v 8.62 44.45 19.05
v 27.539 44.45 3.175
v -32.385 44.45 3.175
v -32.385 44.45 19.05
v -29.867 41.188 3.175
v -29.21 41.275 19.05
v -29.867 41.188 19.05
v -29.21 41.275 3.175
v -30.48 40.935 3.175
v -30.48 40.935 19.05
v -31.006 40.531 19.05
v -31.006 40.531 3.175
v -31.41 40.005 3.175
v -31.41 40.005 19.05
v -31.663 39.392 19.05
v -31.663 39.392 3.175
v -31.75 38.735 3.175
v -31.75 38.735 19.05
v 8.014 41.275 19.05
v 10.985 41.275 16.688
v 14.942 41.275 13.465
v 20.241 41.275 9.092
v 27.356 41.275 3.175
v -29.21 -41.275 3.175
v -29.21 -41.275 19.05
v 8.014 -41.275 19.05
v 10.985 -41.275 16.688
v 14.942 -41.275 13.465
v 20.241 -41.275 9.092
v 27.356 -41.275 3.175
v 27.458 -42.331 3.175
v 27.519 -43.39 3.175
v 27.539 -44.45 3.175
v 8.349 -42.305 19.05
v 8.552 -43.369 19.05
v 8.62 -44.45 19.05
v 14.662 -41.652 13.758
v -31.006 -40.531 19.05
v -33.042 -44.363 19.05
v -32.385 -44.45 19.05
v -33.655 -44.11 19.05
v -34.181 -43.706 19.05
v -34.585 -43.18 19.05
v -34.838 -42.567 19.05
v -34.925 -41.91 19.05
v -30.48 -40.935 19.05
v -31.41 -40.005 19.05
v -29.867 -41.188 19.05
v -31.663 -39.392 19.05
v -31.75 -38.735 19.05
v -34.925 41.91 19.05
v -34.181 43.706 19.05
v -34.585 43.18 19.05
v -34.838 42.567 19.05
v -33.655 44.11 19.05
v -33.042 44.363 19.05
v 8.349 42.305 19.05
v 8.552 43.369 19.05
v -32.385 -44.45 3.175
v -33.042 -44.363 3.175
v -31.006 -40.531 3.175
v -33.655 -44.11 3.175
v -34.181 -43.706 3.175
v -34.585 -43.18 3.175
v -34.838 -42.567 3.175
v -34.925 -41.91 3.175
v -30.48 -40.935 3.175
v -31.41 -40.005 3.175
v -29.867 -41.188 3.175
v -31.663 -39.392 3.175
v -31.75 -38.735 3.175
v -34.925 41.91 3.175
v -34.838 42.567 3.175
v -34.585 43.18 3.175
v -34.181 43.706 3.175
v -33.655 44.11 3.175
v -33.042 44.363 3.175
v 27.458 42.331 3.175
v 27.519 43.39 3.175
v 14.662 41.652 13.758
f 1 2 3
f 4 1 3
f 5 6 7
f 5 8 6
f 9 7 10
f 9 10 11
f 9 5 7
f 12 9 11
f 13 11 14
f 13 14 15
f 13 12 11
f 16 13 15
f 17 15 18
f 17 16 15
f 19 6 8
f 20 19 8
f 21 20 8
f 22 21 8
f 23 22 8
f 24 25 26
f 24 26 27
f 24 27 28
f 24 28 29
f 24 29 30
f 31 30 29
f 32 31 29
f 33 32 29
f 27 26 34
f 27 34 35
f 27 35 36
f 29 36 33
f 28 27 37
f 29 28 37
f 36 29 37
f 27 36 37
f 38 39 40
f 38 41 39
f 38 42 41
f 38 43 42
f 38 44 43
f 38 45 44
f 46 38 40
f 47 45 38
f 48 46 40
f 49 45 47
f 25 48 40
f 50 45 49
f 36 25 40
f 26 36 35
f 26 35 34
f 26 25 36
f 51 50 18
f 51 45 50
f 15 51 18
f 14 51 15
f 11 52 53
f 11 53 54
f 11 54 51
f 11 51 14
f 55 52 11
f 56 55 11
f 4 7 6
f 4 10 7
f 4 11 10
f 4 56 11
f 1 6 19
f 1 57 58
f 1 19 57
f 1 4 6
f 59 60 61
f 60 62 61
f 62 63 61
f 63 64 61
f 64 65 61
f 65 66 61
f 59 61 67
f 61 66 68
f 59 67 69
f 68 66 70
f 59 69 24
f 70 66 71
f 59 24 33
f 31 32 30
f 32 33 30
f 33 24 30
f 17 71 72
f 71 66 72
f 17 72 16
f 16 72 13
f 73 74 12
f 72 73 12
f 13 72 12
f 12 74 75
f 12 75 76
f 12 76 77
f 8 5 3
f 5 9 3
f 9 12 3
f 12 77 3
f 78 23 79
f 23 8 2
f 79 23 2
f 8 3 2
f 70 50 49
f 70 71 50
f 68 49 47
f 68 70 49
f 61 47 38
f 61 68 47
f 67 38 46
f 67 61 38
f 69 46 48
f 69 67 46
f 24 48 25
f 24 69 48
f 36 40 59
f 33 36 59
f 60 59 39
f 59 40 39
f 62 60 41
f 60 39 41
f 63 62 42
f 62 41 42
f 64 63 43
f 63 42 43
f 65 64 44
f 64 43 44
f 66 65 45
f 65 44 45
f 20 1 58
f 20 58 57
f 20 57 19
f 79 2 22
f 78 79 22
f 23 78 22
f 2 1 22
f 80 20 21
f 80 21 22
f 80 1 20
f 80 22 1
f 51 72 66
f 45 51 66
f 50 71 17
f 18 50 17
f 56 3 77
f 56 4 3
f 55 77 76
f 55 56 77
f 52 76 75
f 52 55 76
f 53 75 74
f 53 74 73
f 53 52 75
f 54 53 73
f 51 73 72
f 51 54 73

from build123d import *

# Parameters (mm, degrees)
F1_DEPTH     = 3.175
F2_DEPTH     = 19.05
F3_DEPTH     = 3.175
F4_T4_ANGLE  = 359.64
F4_T11_ANGLE = 359.64
F4_T16_ANGLE = 359.64
F4_T18_ANGLE = 359.64
F5_R         = 2.54
F6_W         = 173.444584012
F6_H         = 315.2023479342
F7_DEPTH     = 3.175


# Not quite as in the source:
# - a fillet or chamfer that OpenCascade refuses, or shapes differently, is made with other operations: its cross-section is extruded or revolved along the edge and cut away or added


with BuildPart() as f1:
    # F0 (on Top) → F1 (new body)
    with BuildSketch(Plane.XY):
        with BuildLine():
            Line((-34.925, 44.45), (-28.575, 44.45))
            ThreePointArc((-28.575, 44.45), (-39.4151280605, 48.9401280605), (-34.925, 38.1))
            Line((-34.925, 38.1), (-34.925, 44.45))
        make_face()
        with BuildLine():
            ThreePointArc((6.35, 44.45), (0, 50.8), (-6.35, 44.45))
            Line((-6.35, 44.45), (6.35, 44.45))
        make_face()
        with BuildLine():
            Line((-34.925, -44.45), (-34.925, -38.1))
            ThreePointArc((-34.925, -38.1), (-39.4151280605, -48.9401280605), (-28.575, -44.45))
            Line((-28.575, -44.45), (-34.925, -44.45))
        make_face()
        with BuildLine():
            Line((6.35, -44.45), (-6.35, -44.45))
            ThreePointArc((-6.35, -44.45), (0, -50.8), (6.35, -44.45))
        make_face()
        with BuildLine():
            ThreePointArc((-28.575, 44.45), (-28.7913710031, 42.8064990636), (-29.425738686, 41.275))
            Line((-29.425738686, 41.275), (-5.499261314, 41.275))
            ThreePointArc((-5.499261314, 41.275), (-6.1336289969, 42.8064990636), (-6.35, 44.45))
            Line((-6.35, 44.45), (-28.575, 44.45))
        make_face()
        with BuildLine():
            Line((-5.499261314, -41.275), (-29.425738686, -41.275))
            ThreePointArc((-29.425738686, -41.275), (-28.7913710031, -42.8064990636), (-28.575, -44.45))
            Line((-28.575, -44.45), (-6.35, -44.45))
            ThreePointArc((-6.35, -44.45), (-6.1336289969, -42.8064990636), (-5.499261314, -41.275))
        make_face()
        with BuildLine():
            Line((-31.75, -38.950738686), (-31.75, 38.950738686))
            ThreePointArc((-31.75, 38.950738686), (-33.2814990636, 38.3163710031), (-34.925, 38.1))
            Line((-34.925, 38.1), (-34.925, -38.1))
            ThreePointArc((-34.925, -38.1), (-33.2814990636, -38.3163710031), (-31.75, -38.950738686))
        make_face()
        with BuildLine():
            Line((-31.75, 38.950738686), (-31.75, 41.275))
            Line((-31.75, 41.275), (-29.425738686, 41.275))
            ThreePointArc((-29.425738686, 41.275), (-28.7913710031, 42.8064990636), (-28.575, 44.45))
            Line((-28.575, 44.45), (-34.925, 44.45))
            Line((-34.925, 44.45), (-34.925, 38.1))
            ThreePointArc((-34.925, 38.1), (-33.2814990636, 38.3163710031), (-31.75, 38.950738686))
        make_face()
        with BuildLine():
            ThreePointArc((-6.35, 44.45), (-6.1336289969, 42.8064990636), (-5.499261314, 41.275))
            Line((-5.499261314, 41.275), (5.499261314, 41.275))
            ThreePointArc((5.499261314, 41.275), (6.1336289969, 42.8064990636), (6.35, 44.45))
            Line((6.35, 44.45), (-6.35, 44.45))
        make_face()
        with BuildLine():
            Line((-31.75, -41.275), (-31.75, -38.950738686))
            ThreePointArc((-31.75, -38.950738686), (-33.2814990636, -38.3163710031), (-34.925, -38.1))
            Line((-34.925, -38.1), (-34.925, -44.45))
            Line((-34.925, -44.45), (-28.575, -44.45))
            ThreePointArc((-28.575, -44.45), (-28.7913710031, -42.8064990636), (-29.425738686, -41.275))
            Line((-29.425738686, -41.275), (-31.75, -41.275))
        make_face()
        with BuildLine():
            Line((5.499261314, -41.275), (-5.499261314, -41.275))
            ThreePointArc((-5.499261314, -41.275), (-6.1336289969, -42.8064990636), (-6.35, -44.45))
            Line((-6.35, -44.45), (6.35, -44.45))
            ThreePointArc((6.35, -44.45), (6.1336289969, -42.8064990636), (5.499261314, -41.275))
        make_face()
    extrude(amount=F1_DEPTH)

    # F0 (on Top) → F2 (join)
    with BuildSketch(Plane.XY):
        with BuildLine():
            ThreePointArc((-28.575, 44.45), (-28.7913710031, 42.8064990636), (-29.425738686, 41.275))
            Line((-29.425738686, 41.275), (-5.499261314, 41.275))
            ThreePointArc((-5.499261314, 41.275), (-6.1336289969, 42.8064990636), (-6.35, 44.45))
            Line((-6.35, 44.45), (-28.575, 44.45))
        make_face()
        with BuildLine():
            ThreePointArc((-6.35, 44.45), (-6.1336289969, 42.8064990636), (-5.499261314, 41.275))
            Line((-5.499261314, 41.275), (5.499261314, 41.275))
            ThreePointArc((5.499261314, 41.275), (6.1336289969, 42.8064990636), (6.35, 44.45))
            Line((6.35, 44.45), (-6.35, 44.45))
        make_face()
        with BuildLine():
            Line((-31.75, 38.950738686), (-31.75, 41.275))
            Line((-31.75, 41.275), (-29.425738686, 41.275))
            ThreePointArc((-29.425738686, 41.275), (-28.7913710031, 42.8064990636), (-28.575, 44.45))
            Line((-28.575, 44.45), (-34.925, 44.45))
            Line((-34.925, 44.45), (-34.925, 38.1))
            ThreePointArc((-34.925, 38.1), (-33.2814990636, 38.3163710031), (-31.75, 38.950738686))
        make_face()
        with BuildLine():
            Line((-31.75, -38.950738686), (-31.75, 38.950738686))
            ThreePointArc((-31.75, 38.950738686), (-33.2814990636, 38.3163710031), (-34.925, 38.1))
            Line((-34.925, 38.1), (-34.925, -38.1))
            ThreePointArc((-34.925, -38.1), (-33.2814990636, -38.3163710031), (-31.75, -38.950738686))
        make_face()
        with BuildLine():
            Line((-31.75, -41.275), (-31.75, -38.950738686))
            ThreePointArc((-31.75, -38.950738686), (-33.2814990636, -38.3163710031), (-34.925, -38.1))
            Line((-34.925, -38.1), (-34.925, -44.45))
            Line((-34.925, -44.45), (-28.575, -44.45))
            ThreePointArc((-28.575, -44.45), (-28.7913710031, -42.8064990636), (-29.425738686, -41.275))
            Line((-29.425738686, -41.275), (-31.75, -41.275))
        make_face()
        with BuildLine():
            Line((-5.499261314, -41.275), (-29.425738686, -41.275))
            ThreePointArc((-29.425738686, -41.275), (-28.7913710031, -42.8064990636), (-28.575, -44.45))
            Line((-28.575, -44.45), (-6.35, -44.45))
            ThreePointArc((-6.35, -44.45), (-6.1336289969, -42.8064990636), (-5.499261314, -41.275))
        make_face()
        with BuildLine():
            Line((5.499261314, -41.275), (-5.499261314, -41.275))
            ThreePointArc((-5.499261314, -41.275), (-6.1336289969, -42.8064990636), (-6.35, -44.45))
            Line((-6.35, -44.45), (6.35, -44.45))
            ThreePointArc((6.35, -44.45), (6.1336289969, -42.8064990636), (5.499261314, -41.275))
        make_face()
    extrude(amount=F2_DEPTH)

    # F0 (on Top) → F3 (join)
    with BuildSketch(Plane.XY):
        with BuildLine():
            ThreePointArc((6.35, 44.45), (6.1336289969, 42.8064990636), (5.499261314, 41.275))
            Line((5.499261314, 41.275), (31.75, 41.275))
            Line((31.75, 41.275), (31.75, -41.275))
            Line((31.75, -41.275), (5.499261314, -41.275))
            ThreePointArc((5.499261314, -41.275), (6.1336289969, -42.8064990636), (6.35, -44.45))
            Line((6.35, -44.45), (34.925, -44.45))
            Line((34.925, -44.45), (34.925, 44.45))
            Line((34.925, 44.45), (6.35, 44.45))
        make_face()
        with BuildLine():
            Line((-5.499261314, 41.275), (-29.425738686, 41.275))
            ThreePointArc((-29.425738686, 41.275), (-30.4348719395, 39.9598719395), (-31.75, 38.950738686))
            Line((-31.75, 38.950738686), (-31.75, -38.950738686))
            ThreePointArc((-31.75, -38.950738686), (-30.4348719395, -39.9598719395), (-29.425738686, -41.275))
            Line((-29.425738686, -41.275), (-5.499261314, -41.275))
            ThreePointArc((-5.499261314, -41.275), (0, -38.1), (5.499261314, -41.275))
            Line((5.499261314, -41.275), (31.75, -41.275))
            Line((31.75, -41.275), (31.75, 41.275))
            Line((31.75, 41.275), (5.499261314, 41.275))
            ThreePointArc((5.499261314, 41.275), (0, 38.1), (-5.499261314, 41.275))
        make_face()
        with BuildLine():
            Line((5.499261314, 41.275), (-5.499261314, 41.275))
            ThreePointArc((-5.499261314, 41.275), (0, 38.1), (5.499261314, 41.275))
        make_face()
        with BuildLine():
            Line((-29.425738686, 41.275), (-31.75, 41.275))
            Line((-31.75, 41.275), (-31.75, 38.950738686))
            ThreePointArc((-31.75, 38.950738686), (-30.4348719395, 39.9598719395), (-29.425738686, 41.275))
        make_face()
        with BuildLine():
            ThreePointArc((5.499261314, -41.275), (0, -38.1), (-5.499261314, -41.275))
            Line((-5.499261314, -41.275), (5.499261314, -41.275))
        make_face()
        with BuildLine():
            ThreePointArc((-29.425738686, -41.275), (-30.4348719395, -39.9598719395), (-31.75, -38.950738686))
            Line((-31.75, -38.950738686), (-31.75, -41.275))
            Line((-31.75, -41.275), (-29.425738686, -41.275))
        make_face()
    extrude(amount=F3_DEPTH)

    # F4: chamfer of 17.78 x 21.1893788763 on 4 edges, made by hand


with BuildPart() as f4_tool2:
    # F4_s3 → F4_t4 (revolve)
    with BuildSketch(Plane(origin=(-7.9045602021, -1.4531788711, 0), x_dir=(0, 0, 1), z_dir=(-0.983517952, -0.1808105031, 0))):
        Polygon((3.175, -16.1779940912), (20.955, -37.3673729675), (3.175, -37.3673729675), align=None)
    revolve(axis=Axis((0, -44.45, 3.175), (0, 0, -1)), revolution_arc=F4_T4_ANGLE)

    split(bisect_by=Plane.XY.offset(19.05), keep=Keep.BOTTOM)

    split(bisect_by=Plane.XZ.offset(44.45), keep=Keep.BOTTOM)

    split(bisect_by=Plane.XZ.offset(41.275), keep=Keep.TOP)


with BuildPart() as f1_1:
    add(f1.part)

    # F4_t1: union F4_tool2
    add(f4_tool2.part)


with BuildPart() as f4_tool9:
    # F4_s10 → F4_t11 (revolve)
    with BuildSketch(Plane(origin=(-8.164955624, 1.5541479455, 0), x_dir=(0, 0, 1), z_dir=(0.9823624798, -0.186986519, 0))):
        Polygon((20.955, -37.3160122271), (3.175, -16.1266333508), (3.175, -37.3160122271), align=None)
    revolve(axis=Axis((0, 44.45, 3.175), (0, 0, -1)), revolution_arc=F4_T11_ANGLE)

    split(bisect_by=Plane.XZ.offset(-44.45), keep=Keep.TOP)

    split(bisect_by=Plane.XY.offset(19.05), keep=Keep.BOTTOM)

    split(bisect_by=Plane.XZ.offset(-41.275), keep=Keep.BOTTOM)


with BuildPart() as f1_2:
    add(f1_1.part)

    # F4_t8: union F4_tool9
    add(f4_tool9.part)

    # F4_s15 → F4_t16 (revolve, cut)
    with BuildSketch(Plane(origin=(-0.1396428746, -0.0004387025, 0), x_dir=(0, 0, 1), z_dir=(0.9999950652, 0.0031415875, 0))):
        Polygon((-14.605, 38.0997806482), (-9.276717342, 44.4497806482), (3.175, 44.4497806482), (3.175, 38.0997806482), align=None)
    revolve(axis=Axis((0, -44.45, 3.175), (0, 0, 1)), revolution_arc=F4_T16_ANGLE, mode=Mode.SUBTRACT)

    # F4_s17 → F4_t18 (revolve, cut)
    with BuildSketch(Plane(origin=(0.1396428746, 0.0004387025, 0), x_dir=(0, 0, 1), z_dir=(-0.9999950652, -0.0031415875, 0))):
        Polygon((-14.605, 38.0997806482), (-9.276717342, 44.4497806482), (3.175, 44.4497806482), (3.175, 38.0997806482), align=None)
    revolve(axis=Axis((0, 44.45, 3.175), (0, 0, 1)), revolution_arc=F4_T18_ANGLE, mode=Mode.SUBTRACT)

    # F5
    f5_edges = [f1_2.edges().sort_by_distance(p)[0] for p in [
        (-31.75, 41.275, 11.1125),
        (-31.75, -41.275, 11.1125),
        (-34.925, -44.45, 11.1125),
        (-34.925, 44.45, 11.1125),
    ]]
    fillet(f5_edges, radius=F5_R)

    # F6 (on Top) → F7 (cut)
    with BuildSketch(Plane.XY):
        with Locations((-10.1288706064, 37.9523970187)):
            Rectangle(F6_W, F6_H)
    extrude(amount=F7_DEPTH, mode=Mode.SUBTRACT)


solid = f1_2.part
